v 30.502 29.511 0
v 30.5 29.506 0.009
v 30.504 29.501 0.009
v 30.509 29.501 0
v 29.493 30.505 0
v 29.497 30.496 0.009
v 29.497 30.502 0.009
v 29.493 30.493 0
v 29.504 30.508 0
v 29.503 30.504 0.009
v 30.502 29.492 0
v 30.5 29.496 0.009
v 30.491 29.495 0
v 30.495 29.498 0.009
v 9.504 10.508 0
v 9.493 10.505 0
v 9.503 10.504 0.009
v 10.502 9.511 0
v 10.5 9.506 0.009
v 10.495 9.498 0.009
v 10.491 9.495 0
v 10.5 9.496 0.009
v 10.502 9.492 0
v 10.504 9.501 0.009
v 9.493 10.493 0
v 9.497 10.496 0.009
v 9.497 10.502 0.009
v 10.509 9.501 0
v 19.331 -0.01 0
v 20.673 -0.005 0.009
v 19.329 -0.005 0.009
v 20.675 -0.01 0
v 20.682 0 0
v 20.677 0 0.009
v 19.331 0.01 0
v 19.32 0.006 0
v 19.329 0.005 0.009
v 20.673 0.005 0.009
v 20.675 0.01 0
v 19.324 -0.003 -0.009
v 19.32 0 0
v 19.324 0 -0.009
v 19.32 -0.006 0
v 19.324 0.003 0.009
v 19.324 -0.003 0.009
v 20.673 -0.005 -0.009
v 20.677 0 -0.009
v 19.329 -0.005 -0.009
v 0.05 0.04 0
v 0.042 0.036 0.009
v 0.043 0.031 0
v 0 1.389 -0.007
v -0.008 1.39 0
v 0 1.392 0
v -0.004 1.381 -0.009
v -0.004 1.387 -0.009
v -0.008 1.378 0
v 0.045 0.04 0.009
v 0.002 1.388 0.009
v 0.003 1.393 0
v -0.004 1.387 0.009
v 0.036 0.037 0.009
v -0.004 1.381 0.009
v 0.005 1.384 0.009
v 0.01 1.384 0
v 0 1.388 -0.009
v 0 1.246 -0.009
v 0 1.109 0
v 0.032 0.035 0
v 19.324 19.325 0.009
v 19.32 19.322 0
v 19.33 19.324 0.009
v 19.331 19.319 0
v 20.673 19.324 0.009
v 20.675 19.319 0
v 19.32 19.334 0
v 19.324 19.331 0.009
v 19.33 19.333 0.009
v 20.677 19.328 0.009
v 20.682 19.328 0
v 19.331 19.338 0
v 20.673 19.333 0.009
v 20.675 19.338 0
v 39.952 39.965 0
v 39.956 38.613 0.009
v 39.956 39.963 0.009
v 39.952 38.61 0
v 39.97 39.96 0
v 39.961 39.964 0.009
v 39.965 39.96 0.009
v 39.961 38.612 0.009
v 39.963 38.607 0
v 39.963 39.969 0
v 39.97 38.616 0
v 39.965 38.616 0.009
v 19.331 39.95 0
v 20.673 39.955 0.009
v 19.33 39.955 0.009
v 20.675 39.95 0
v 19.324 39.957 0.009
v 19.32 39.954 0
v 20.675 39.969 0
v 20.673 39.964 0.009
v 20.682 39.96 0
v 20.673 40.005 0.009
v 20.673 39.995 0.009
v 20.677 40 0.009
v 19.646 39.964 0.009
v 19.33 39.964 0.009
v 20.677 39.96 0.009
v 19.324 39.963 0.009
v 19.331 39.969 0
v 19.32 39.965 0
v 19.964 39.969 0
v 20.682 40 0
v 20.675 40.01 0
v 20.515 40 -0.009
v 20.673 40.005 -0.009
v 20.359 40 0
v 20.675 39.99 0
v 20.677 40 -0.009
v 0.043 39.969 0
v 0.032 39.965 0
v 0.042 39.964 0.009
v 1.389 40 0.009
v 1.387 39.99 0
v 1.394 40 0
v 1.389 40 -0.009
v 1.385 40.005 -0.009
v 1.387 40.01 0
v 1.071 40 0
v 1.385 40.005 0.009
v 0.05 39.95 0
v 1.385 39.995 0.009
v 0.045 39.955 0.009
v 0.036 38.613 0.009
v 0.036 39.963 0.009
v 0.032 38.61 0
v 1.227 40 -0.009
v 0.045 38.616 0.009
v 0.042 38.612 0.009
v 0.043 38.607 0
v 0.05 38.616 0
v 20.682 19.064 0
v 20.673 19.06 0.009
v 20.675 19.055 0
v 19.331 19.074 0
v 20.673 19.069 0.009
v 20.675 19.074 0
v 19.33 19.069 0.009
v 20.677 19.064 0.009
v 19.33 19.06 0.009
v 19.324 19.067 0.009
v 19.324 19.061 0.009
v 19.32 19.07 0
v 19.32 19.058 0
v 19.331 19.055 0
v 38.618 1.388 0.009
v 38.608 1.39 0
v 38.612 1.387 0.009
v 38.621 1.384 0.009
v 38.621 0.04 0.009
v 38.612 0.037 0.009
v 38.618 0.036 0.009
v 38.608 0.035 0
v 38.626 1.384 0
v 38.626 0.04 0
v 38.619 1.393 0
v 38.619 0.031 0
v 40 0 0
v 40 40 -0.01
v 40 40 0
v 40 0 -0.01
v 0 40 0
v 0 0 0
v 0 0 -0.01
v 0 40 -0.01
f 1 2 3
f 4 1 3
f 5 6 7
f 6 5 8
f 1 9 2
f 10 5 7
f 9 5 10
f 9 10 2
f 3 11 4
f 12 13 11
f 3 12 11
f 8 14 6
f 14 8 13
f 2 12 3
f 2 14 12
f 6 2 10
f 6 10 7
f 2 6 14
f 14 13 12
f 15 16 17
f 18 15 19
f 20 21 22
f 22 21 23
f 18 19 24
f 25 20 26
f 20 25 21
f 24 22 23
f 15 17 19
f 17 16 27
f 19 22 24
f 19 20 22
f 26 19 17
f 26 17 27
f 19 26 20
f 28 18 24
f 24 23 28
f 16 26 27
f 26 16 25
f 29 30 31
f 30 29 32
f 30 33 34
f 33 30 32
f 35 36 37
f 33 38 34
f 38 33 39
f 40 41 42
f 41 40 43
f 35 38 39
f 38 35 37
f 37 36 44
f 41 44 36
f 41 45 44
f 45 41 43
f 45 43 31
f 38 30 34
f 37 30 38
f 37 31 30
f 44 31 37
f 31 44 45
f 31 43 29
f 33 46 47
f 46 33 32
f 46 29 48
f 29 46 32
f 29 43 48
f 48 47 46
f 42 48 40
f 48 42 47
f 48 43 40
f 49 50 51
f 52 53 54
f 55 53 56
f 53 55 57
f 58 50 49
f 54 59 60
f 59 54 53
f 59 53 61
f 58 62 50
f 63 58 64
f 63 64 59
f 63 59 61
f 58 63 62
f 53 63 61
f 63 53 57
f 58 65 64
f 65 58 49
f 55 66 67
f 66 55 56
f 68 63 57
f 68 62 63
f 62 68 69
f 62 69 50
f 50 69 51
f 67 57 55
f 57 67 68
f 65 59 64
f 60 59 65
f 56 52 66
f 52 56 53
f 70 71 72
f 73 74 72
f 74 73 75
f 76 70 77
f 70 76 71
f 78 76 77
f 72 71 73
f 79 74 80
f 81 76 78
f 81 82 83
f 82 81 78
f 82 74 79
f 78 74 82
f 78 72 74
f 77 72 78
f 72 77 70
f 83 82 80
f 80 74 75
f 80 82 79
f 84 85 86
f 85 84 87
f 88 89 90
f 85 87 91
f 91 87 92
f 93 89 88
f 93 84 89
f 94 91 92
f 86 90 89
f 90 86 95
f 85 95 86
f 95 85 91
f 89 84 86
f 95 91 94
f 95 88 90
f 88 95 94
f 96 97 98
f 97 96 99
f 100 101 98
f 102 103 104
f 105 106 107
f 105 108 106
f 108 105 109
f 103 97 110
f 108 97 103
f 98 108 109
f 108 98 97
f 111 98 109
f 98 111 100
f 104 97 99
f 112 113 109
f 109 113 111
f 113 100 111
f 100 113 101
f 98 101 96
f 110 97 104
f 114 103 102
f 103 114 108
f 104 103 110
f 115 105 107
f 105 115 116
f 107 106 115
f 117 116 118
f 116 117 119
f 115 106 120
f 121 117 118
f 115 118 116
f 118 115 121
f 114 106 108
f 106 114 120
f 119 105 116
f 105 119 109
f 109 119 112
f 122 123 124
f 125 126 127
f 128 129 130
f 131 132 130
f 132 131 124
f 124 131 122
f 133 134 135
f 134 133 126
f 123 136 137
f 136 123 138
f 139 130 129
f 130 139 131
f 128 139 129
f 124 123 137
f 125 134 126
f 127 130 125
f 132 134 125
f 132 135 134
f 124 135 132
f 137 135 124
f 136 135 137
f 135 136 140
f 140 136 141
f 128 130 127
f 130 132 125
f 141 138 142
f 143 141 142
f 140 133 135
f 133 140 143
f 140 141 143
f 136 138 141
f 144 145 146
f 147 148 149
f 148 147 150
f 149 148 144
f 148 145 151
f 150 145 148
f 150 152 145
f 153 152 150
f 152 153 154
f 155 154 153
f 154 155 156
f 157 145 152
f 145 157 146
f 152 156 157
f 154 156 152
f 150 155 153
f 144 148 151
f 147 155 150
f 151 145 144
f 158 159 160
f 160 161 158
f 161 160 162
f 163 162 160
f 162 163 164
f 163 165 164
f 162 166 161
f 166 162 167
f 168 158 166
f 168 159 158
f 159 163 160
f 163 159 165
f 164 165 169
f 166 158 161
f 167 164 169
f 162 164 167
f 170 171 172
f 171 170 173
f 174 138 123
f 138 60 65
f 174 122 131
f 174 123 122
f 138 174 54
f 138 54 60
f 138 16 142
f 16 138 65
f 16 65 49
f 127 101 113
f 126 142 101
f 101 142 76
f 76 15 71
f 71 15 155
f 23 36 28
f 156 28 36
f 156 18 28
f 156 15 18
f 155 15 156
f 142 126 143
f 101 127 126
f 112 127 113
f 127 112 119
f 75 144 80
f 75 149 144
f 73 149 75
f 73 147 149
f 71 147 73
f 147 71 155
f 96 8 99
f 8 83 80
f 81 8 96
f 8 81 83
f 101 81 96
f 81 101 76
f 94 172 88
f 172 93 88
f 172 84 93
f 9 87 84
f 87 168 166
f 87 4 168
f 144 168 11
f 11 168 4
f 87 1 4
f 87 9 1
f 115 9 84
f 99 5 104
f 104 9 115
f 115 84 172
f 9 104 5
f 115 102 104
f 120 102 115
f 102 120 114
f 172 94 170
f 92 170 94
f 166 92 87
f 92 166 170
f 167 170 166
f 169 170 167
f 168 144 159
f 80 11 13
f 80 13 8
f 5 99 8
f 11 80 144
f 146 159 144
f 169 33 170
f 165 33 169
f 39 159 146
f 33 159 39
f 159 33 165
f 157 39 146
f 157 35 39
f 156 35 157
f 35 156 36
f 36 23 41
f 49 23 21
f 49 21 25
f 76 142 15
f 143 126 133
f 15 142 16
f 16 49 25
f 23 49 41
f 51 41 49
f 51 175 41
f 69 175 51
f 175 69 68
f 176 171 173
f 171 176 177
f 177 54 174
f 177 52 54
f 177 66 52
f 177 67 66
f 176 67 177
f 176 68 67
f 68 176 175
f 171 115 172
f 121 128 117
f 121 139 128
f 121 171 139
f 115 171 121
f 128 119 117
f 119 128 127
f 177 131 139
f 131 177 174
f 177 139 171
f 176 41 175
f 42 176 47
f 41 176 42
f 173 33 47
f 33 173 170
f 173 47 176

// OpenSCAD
hull(){
    translate([30.49888052351997, 29.50111947648003]) sphere(0.01);
    translate([29.50111947648003, 30.49888052351997]) sphere(0.01);
}
hull(){
    translate([9.50111947648003, 10.49888052351997]) sphere(0.01);
    translate([10.49888052351997, 9.50111947648003]) sphere(0.01);
}
hull(){
    translate([20.67162954616456, 0.0]) sphere(0.01);
    translate([19.32789988745574, 0.0]) sphere(0.01);
}
hull(){
    translate([0.0, 1.3836614258979487]) sphere(0.01);
    translate([0.04040233356883343, 0.04040233356883343]) sphere(0.01);
}
hull(){
    translate([20.671656678748388, 19.328343321251612]) sphere(0.01);
    translate([19.328343321251612, 19.328343321251612]) sphere(0.01);
}
hull(){
    translate([39.95959766643117, 39.95959766643117]) sphere(0.01);
    translate([39.95959766643117, 38.61628430893439]) sphere(0.01);
}
hull(){
    translate([20.671656678748388, 39.95959766643117]) sphere(0.01);
    translate([19.328343321251612, 39.95959766643117]) sphere(0.01);
}
hull(){
    translate([19.328343321251612, 39.95959766643117]) sphere(0.01);
    translate([20.67162954616456, 40.0]) sphere(0.01);
}
hull(){
    translate([1.3836614258979487, 40.0]) sphere(0.01);
    translate([0.04040233356883343, 39.95959766643117]) sphere(0.01);
}
hull(){
    translate([0.04040233356883343, 39.95959766643117]) sphere(0.01);
    translate([0.04040233356883343, 38.61628430893439]) sphere(0.01);
}
hull(){
    translate([19.328343321251612, 19.064328263108155]) sphere(0.01);
    translate([20.671656678748388, 19.064328263108155]) sphere(0.01);
}
hull(){
    translate([38.61628430893439, 1.3837156910656077]) sphere(0.01);
    translate([38.61628430893439, 0.04040233356883343]) sphere(0.01);
}
translate([0,0,-0.01]) color([0.1,0.1,0.1]) cube([40,40,0.01]);
